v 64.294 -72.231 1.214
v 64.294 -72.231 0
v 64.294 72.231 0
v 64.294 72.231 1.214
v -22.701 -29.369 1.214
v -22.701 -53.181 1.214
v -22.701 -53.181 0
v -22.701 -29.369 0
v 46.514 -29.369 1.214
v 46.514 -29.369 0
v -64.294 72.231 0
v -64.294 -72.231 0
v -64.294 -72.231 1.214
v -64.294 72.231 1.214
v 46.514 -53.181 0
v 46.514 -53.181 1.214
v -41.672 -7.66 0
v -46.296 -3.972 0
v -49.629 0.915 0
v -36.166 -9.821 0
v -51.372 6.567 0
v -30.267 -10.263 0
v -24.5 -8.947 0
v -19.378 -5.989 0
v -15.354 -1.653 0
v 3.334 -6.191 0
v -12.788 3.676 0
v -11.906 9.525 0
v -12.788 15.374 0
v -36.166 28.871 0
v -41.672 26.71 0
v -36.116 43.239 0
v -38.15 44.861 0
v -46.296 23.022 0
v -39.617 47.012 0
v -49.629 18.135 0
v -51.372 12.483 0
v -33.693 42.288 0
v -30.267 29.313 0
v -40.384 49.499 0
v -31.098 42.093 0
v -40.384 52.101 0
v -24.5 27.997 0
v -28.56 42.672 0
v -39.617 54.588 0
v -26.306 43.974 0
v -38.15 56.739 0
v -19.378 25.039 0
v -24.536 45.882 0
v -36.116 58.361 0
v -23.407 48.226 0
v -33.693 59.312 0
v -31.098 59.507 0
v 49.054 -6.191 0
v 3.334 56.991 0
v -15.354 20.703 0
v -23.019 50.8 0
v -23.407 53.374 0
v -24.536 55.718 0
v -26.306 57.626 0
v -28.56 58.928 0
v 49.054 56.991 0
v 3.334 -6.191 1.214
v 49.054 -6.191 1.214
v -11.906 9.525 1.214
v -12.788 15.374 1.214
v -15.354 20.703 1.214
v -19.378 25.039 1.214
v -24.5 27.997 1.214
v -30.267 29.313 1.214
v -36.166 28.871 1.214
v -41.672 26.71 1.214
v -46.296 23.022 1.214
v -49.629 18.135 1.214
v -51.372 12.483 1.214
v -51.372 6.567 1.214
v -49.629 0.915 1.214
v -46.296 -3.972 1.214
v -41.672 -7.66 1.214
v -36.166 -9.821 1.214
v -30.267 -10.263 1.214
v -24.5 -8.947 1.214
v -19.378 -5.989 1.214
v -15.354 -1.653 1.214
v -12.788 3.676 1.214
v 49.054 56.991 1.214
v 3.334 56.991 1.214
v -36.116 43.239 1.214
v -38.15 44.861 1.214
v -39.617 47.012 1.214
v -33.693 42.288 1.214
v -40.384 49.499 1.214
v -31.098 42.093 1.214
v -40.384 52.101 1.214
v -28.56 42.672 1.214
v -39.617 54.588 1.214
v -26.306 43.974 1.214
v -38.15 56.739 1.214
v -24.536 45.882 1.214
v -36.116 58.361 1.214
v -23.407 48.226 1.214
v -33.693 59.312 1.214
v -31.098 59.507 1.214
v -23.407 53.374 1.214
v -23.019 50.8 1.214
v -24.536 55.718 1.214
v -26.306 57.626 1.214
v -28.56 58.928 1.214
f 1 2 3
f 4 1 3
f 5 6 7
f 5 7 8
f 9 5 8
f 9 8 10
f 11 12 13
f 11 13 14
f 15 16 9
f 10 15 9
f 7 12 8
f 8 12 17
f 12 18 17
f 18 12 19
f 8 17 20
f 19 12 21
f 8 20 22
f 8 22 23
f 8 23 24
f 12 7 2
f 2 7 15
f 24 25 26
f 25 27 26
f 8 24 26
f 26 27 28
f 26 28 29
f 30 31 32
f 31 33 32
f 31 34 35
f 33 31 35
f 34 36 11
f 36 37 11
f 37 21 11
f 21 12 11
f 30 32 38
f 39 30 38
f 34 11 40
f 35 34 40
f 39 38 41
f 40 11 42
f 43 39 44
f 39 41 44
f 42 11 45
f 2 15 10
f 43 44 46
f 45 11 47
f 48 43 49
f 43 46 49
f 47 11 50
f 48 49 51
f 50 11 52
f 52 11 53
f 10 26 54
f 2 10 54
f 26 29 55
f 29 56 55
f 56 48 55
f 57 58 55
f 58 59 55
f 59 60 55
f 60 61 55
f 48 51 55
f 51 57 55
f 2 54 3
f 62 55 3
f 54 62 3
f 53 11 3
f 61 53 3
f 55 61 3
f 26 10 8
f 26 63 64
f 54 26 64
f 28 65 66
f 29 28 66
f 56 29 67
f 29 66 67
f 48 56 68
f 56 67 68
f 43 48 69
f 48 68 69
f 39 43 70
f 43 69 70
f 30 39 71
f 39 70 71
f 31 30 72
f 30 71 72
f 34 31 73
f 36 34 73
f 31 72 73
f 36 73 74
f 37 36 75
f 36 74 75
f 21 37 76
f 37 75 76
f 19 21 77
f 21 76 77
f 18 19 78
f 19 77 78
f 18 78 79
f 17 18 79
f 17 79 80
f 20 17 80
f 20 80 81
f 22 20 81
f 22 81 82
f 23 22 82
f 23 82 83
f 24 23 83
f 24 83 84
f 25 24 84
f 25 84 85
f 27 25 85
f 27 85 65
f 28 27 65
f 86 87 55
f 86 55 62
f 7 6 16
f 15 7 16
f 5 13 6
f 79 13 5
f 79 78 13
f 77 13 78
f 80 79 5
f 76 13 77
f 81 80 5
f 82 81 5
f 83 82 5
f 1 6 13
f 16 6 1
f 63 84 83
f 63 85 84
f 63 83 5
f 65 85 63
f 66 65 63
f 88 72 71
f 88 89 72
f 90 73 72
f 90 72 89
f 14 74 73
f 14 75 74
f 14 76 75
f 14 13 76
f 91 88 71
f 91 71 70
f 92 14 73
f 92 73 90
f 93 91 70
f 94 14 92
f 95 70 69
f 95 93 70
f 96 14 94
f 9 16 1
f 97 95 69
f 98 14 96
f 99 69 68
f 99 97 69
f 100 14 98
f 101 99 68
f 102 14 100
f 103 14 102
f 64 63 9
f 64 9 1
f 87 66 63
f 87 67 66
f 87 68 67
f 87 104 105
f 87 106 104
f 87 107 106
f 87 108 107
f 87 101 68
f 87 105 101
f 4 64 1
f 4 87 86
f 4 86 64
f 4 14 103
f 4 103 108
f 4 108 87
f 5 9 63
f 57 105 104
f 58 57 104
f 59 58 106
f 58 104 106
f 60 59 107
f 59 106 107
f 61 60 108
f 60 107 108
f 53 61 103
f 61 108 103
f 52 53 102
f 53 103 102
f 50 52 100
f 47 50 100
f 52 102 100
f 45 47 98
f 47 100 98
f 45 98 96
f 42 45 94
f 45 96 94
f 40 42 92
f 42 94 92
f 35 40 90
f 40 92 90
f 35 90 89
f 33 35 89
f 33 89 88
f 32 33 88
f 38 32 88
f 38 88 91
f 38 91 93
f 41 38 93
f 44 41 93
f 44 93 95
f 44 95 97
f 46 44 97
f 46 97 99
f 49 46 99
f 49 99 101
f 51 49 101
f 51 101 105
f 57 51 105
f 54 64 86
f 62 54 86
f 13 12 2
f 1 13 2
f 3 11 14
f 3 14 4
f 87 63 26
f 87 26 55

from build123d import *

# Parameters (mm, degrees)
SKETCH1_W           = 128.5875
SKETCH1_H           = 144.4625
BOSS_EXTRUDE1_DEPTH = 1.21412
SKETCH3_R           = 8.73125
SKETCH3_R_2         = 19.84375
SKETCH3_W           = 79.375
SKETCH3_H           = 36.5125
SKETCH3_W_2         = 50.8
SKETCH3_H_2         = 68.2625
CUT_EXTRUDE1_DEPTH  = 2.21412
SKETCH4_W           = 50.8
SKETCH4_H           = 68.2625
SKETCH4_W_2         = 45.72
SKETCH4_H_2         = 63.1825
BOSS_EXTRUDE2_DEPTH = 1.21412
SKETCH5_W           = 79.375
SKETCH5_H           = 36.5125
SKETCH5_W_2         = 69.215
SKETCH5_H_2         = 23.8125
BOSS_EXTRUDE3_DEPTH = 1.21412


with BuildPart() as part:
    # Sketch1 → Boss-Extrude1 (new body)
    with BuildSketch(Plane.XY):
        Rectangle(SKETCH1_W, SKETCH1_H)
    extrude(amount=BOSS_EXTRUDE1_DEPTH)

    # Sketch3 → Cut-Extrude1 (cut, through all)
    with BuildSketch(Plane.XY.offset(1.21412)):
        with Locations((-31.75, 50.8)):
            Circle(SKETCH3_R)
        with Locations((-31.75, 9.525)):
            Circle(SKETCH3_R_2)
        with Locations((11.90625, -41.275)):
            Rectangle(SKETCH3_W, SKETCH3_H)
        with Locations((26.19375, 25.4)):
            Rectangle(SKETCH3_W_2, SKETCH3_H_2)
    extrude(amount=-CUT_EXTRUDE1_DEPTH, mode=Mode.SUBTRACT)

    # Sketch4 → Boss-Extrude2 (add)
    with BuildSketch(Plane.XY.offset(1.21412)):
        with Locations((26.19375, 25.4)):
            Rectangle(SKETCH4_W, SKETCH4_H)
        with Locations((26.19375, 25.4)):
            Rectangle(SKETCH4_W_2, SKETCH4_H_2, mode=Mode.SUBTRACT)
    extrude(amount=-BOSS_EXTRUDE2_DEPTH)

    # Sketch5 → Boss-Extrude3 (add)
    with BuildSketch(Plane.XY.offset(1.21412)):
        with Locations((11.90625, -41.275)):
            Rectangle(SKETCH5_W, SKETCH5_H)
        with Locations((11.90625, -41.275)):
            Rectangle(SKETCH5_W_2, SKETCH5_H_2, mode=Mode.SUBTRACT)
    extrude(amount=-BOSS_EXTRUDE3_DEPTH)


solid = part.part
